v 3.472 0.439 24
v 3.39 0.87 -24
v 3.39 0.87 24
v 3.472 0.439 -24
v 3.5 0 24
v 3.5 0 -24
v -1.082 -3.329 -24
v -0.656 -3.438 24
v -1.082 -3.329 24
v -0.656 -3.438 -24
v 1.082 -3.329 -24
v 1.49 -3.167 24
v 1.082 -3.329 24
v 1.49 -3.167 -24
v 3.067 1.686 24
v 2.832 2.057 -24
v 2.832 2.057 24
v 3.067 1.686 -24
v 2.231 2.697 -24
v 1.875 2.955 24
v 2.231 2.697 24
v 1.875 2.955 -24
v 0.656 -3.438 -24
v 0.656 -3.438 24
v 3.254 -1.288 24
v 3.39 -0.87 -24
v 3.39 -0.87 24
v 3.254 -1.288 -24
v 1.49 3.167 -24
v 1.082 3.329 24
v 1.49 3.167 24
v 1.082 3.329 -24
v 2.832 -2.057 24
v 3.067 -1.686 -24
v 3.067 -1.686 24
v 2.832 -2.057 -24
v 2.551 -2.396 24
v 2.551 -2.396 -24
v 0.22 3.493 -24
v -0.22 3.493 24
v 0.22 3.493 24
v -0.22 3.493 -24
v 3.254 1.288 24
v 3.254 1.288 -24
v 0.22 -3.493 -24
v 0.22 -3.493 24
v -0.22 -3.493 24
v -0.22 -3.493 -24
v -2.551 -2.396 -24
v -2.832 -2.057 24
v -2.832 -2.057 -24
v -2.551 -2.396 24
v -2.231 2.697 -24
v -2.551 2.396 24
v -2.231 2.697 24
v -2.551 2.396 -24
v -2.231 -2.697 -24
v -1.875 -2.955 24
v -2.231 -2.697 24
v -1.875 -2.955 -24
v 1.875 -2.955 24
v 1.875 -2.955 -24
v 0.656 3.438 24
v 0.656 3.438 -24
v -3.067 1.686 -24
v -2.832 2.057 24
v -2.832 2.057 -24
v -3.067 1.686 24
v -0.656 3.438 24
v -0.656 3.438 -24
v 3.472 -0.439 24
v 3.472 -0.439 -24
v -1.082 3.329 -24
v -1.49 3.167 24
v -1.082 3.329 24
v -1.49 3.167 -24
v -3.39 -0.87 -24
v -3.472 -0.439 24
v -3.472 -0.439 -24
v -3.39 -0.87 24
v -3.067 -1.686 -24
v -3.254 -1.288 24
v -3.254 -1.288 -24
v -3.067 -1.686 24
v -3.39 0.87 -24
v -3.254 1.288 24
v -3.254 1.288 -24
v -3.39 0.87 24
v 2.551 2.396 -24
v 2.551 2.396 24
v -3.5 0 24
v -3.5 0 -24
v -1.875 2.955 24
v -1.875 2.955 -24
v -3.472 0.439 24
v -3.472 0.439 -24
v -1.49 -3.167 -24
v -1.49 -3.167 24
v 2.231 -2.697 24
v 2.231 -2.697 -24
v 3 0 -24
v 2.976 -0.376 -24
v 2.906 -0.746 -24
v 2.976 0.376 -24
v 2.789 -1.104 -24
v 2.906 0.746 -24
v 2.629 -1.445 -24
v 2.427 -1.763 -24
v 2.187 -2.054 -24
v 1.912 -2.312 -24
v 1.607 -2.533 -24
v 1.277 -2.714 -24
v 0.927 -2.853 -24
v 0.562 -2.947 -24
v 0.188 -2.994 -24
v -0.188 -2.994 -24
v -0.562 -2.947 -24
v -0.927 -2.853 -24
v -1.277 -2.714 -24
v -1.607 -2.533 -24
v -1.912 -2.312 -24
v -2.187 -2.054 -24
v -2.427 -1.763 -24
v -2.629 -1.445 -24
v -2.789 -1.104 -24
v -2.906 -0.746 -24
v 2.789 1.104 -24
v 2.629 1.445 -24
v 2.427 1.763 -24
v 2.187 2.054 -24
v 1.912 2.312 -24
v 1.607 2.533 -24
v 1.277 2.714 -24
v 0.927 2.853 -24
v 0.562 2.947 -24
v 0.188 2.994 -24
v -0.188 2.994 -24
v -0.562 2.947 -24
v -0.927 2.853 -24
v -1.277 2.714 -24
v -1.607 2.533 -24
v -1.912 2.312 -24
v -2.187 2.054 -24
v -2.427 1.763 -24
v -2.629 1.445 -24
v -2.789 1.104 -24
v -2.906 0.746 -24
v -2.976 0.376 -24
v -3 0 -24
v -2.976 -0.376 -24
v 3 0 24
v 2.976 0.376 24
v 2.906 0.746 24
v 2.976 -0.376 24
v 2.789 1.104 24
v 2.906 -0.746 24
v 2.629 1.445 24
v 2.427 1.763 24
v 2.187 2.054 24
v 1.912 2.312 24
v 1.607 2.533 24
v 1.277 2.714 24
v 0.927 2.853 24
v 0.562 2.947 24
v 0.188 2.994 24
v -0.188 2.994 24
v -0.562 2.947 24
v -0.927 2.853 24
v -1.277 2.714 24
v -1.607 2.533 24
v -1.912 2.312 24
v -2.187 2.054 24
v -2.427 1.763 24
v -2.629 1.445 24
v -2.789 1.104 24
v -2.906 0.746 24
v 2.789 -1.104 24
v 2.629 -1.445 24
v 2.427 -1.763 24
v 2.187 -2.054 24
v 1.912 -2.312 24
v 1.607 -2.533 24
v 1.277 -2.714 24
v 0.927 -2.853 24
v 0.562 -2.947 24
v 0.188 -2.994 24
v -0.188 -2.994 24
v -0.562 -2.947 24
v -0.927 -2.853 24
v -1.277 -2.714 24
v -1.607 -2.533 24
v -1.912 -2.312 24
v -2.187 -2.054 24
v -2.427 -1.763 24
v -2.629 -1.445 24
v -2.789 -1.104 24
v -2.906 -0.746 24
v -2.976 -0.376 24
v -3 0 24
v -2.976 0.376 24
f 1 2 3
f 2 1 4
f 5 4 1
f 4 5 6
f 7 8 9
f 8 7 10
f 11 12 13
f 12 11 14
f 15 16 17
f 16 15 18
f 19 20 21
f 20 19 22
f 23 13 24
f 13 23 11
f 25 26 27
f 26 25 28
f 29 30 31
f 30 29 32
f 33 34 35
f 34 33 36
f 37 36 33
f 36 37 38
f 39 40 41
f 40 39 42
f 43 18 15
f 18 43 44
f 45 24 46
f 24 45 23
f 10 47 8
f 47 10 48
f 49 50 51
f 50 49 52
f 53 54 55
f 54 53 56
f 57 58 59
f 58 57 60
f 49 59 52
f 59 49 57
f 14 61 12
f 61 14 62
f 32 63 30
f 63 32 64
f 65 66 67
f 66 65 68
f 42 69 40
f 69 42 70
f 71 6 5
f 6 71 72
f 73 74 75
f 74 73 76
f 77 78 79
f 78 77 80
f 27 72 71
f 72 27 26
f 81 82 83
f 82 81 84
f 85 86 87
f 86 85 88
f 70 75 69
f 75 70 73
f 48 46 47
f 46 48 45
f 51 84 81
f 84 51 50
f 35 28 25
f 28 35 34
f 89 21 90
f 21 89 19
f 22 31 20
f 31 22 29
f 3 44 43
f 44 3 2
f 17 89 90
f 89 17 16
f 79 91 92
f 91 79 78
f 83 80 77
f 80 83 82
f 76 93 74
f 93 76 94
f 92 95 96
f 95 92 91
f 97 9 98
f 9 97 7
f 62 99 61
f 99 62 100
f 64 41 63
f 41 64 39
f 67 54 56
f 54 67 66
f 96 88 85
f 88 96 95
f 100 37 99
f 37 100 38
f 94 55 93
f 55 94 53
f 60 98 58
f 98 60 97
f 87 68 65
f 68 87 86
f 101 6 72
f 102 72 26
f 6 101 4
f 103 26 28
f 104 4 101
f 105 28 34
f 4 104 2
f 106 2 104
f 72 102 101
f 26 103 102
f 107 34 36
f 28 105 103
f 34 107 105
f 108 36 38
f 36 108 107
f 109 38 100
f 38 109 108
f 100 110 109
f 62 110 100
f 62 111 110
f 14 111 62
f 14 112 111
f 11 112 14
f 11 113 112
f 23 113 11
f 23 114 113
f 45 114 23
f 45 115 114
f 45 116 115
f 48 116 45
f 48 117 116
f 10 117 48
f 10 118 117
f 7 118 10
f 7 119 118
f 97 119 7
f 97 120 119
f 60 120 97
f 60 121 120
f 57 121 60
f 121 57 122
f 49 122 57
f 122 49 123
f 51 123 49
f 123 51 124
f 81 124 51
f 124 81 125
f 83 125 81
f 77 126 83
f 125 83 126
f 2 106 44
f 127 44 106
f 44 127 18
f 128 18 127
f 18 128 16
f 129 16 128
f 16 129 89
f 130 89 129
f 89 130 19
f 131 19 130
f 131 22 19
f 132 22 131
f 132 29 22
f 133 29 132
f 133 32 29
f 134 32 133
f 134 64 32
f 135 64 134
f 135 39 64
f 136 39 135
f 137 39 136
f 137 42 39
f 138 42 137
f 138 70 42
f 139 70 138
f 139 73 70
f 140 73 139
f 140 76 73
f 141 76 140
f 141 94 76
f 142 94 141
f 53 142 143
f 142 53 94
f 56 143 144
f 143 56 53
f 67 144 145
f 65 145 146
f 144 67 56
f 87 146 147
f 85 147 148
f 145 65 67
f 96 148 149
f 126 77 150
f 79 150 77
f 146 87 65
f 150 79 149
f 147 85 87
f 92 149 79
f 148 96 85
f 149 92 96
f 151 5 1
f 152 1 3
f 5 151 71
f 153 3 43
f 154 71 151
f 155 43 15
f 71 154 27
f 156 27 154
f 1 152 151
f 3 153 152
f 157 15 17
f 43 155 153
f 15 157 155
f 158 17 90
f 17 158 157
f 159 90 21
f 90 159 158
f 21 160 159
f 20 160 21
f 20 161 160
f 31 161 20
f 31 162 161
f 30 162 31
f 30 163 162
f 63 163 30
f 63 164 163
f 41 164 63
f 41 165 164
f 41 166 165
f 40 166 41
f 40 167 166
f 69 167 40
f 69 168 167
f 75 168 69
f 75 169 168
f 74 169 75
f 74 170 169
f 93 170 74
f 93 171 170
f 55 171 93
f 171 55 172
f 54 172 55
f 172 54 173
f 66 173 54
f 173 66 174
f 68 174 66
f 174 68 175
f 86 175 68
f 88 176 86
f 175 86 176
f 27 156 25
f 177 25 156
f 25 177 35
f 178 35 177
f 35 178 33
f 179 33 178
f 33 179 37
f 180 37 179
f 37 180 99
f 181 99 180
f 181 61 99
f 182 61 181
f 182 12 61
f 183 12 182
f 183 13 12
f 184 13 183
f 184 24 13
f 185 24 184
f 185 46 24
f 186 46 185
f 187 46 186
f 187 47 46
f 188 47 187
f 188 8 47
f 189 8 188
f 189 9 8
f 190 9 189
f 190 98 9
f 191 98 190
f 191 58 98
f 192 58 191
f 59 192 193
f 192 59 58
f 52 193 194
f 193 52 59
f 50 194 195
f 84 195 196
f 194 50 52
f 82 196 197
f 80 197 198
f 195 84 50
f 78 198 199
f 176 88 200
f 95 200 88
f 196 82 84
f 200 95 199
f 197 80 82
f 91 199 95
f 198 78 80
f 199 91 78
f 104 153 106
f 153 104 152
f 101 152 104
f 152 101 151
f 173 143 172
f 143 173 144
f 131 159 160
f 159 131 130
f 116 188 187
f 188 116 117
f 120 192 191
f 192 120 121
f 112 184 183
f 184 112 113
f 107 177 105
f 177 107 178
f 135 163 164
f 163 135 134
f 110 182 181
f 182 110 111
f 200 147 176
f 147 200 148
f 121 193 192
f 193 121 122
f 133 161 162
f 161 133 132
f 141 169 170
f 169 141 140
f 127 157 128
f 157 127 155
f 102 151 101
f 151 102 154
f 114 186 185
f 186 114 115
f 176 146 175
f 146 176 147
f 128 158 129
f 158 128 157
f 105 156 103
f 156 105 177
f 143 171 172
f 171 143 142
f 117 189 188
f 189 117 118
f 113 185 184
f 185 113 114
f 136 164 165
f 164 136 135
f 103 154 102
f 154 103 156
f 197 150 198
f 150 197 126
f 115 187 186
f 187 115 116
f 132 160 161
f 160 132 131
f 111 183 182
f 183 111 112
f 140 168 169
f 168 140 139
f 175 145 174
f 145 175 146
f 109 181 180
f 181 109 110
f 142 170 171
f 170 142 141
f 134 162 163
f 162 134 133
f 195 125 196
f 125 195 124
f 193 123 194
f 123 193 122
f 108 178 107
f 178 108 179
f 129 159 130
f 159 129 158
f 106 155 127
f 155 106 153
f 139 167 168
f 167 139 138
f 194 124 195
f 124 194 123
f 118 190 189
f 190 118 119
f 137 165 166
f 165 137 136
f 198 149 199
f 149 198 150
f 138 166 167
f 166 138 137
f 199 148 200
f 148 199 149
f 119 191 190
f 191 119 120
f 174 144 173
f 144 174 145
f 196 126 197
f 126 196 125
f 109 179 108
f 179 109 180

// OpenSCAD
$fn = 50;


difference() {
	union() {
		translate(v = [0, 0, -24.0000000000]) {
			cylinder(h = 48, r = 3.5000000000);
		}
	}
	union() {
		translate(v = [0, 0, -100.0000000000]) {
			cylinder(h = 200, r = 3.0000000000);
		}
	}
}
